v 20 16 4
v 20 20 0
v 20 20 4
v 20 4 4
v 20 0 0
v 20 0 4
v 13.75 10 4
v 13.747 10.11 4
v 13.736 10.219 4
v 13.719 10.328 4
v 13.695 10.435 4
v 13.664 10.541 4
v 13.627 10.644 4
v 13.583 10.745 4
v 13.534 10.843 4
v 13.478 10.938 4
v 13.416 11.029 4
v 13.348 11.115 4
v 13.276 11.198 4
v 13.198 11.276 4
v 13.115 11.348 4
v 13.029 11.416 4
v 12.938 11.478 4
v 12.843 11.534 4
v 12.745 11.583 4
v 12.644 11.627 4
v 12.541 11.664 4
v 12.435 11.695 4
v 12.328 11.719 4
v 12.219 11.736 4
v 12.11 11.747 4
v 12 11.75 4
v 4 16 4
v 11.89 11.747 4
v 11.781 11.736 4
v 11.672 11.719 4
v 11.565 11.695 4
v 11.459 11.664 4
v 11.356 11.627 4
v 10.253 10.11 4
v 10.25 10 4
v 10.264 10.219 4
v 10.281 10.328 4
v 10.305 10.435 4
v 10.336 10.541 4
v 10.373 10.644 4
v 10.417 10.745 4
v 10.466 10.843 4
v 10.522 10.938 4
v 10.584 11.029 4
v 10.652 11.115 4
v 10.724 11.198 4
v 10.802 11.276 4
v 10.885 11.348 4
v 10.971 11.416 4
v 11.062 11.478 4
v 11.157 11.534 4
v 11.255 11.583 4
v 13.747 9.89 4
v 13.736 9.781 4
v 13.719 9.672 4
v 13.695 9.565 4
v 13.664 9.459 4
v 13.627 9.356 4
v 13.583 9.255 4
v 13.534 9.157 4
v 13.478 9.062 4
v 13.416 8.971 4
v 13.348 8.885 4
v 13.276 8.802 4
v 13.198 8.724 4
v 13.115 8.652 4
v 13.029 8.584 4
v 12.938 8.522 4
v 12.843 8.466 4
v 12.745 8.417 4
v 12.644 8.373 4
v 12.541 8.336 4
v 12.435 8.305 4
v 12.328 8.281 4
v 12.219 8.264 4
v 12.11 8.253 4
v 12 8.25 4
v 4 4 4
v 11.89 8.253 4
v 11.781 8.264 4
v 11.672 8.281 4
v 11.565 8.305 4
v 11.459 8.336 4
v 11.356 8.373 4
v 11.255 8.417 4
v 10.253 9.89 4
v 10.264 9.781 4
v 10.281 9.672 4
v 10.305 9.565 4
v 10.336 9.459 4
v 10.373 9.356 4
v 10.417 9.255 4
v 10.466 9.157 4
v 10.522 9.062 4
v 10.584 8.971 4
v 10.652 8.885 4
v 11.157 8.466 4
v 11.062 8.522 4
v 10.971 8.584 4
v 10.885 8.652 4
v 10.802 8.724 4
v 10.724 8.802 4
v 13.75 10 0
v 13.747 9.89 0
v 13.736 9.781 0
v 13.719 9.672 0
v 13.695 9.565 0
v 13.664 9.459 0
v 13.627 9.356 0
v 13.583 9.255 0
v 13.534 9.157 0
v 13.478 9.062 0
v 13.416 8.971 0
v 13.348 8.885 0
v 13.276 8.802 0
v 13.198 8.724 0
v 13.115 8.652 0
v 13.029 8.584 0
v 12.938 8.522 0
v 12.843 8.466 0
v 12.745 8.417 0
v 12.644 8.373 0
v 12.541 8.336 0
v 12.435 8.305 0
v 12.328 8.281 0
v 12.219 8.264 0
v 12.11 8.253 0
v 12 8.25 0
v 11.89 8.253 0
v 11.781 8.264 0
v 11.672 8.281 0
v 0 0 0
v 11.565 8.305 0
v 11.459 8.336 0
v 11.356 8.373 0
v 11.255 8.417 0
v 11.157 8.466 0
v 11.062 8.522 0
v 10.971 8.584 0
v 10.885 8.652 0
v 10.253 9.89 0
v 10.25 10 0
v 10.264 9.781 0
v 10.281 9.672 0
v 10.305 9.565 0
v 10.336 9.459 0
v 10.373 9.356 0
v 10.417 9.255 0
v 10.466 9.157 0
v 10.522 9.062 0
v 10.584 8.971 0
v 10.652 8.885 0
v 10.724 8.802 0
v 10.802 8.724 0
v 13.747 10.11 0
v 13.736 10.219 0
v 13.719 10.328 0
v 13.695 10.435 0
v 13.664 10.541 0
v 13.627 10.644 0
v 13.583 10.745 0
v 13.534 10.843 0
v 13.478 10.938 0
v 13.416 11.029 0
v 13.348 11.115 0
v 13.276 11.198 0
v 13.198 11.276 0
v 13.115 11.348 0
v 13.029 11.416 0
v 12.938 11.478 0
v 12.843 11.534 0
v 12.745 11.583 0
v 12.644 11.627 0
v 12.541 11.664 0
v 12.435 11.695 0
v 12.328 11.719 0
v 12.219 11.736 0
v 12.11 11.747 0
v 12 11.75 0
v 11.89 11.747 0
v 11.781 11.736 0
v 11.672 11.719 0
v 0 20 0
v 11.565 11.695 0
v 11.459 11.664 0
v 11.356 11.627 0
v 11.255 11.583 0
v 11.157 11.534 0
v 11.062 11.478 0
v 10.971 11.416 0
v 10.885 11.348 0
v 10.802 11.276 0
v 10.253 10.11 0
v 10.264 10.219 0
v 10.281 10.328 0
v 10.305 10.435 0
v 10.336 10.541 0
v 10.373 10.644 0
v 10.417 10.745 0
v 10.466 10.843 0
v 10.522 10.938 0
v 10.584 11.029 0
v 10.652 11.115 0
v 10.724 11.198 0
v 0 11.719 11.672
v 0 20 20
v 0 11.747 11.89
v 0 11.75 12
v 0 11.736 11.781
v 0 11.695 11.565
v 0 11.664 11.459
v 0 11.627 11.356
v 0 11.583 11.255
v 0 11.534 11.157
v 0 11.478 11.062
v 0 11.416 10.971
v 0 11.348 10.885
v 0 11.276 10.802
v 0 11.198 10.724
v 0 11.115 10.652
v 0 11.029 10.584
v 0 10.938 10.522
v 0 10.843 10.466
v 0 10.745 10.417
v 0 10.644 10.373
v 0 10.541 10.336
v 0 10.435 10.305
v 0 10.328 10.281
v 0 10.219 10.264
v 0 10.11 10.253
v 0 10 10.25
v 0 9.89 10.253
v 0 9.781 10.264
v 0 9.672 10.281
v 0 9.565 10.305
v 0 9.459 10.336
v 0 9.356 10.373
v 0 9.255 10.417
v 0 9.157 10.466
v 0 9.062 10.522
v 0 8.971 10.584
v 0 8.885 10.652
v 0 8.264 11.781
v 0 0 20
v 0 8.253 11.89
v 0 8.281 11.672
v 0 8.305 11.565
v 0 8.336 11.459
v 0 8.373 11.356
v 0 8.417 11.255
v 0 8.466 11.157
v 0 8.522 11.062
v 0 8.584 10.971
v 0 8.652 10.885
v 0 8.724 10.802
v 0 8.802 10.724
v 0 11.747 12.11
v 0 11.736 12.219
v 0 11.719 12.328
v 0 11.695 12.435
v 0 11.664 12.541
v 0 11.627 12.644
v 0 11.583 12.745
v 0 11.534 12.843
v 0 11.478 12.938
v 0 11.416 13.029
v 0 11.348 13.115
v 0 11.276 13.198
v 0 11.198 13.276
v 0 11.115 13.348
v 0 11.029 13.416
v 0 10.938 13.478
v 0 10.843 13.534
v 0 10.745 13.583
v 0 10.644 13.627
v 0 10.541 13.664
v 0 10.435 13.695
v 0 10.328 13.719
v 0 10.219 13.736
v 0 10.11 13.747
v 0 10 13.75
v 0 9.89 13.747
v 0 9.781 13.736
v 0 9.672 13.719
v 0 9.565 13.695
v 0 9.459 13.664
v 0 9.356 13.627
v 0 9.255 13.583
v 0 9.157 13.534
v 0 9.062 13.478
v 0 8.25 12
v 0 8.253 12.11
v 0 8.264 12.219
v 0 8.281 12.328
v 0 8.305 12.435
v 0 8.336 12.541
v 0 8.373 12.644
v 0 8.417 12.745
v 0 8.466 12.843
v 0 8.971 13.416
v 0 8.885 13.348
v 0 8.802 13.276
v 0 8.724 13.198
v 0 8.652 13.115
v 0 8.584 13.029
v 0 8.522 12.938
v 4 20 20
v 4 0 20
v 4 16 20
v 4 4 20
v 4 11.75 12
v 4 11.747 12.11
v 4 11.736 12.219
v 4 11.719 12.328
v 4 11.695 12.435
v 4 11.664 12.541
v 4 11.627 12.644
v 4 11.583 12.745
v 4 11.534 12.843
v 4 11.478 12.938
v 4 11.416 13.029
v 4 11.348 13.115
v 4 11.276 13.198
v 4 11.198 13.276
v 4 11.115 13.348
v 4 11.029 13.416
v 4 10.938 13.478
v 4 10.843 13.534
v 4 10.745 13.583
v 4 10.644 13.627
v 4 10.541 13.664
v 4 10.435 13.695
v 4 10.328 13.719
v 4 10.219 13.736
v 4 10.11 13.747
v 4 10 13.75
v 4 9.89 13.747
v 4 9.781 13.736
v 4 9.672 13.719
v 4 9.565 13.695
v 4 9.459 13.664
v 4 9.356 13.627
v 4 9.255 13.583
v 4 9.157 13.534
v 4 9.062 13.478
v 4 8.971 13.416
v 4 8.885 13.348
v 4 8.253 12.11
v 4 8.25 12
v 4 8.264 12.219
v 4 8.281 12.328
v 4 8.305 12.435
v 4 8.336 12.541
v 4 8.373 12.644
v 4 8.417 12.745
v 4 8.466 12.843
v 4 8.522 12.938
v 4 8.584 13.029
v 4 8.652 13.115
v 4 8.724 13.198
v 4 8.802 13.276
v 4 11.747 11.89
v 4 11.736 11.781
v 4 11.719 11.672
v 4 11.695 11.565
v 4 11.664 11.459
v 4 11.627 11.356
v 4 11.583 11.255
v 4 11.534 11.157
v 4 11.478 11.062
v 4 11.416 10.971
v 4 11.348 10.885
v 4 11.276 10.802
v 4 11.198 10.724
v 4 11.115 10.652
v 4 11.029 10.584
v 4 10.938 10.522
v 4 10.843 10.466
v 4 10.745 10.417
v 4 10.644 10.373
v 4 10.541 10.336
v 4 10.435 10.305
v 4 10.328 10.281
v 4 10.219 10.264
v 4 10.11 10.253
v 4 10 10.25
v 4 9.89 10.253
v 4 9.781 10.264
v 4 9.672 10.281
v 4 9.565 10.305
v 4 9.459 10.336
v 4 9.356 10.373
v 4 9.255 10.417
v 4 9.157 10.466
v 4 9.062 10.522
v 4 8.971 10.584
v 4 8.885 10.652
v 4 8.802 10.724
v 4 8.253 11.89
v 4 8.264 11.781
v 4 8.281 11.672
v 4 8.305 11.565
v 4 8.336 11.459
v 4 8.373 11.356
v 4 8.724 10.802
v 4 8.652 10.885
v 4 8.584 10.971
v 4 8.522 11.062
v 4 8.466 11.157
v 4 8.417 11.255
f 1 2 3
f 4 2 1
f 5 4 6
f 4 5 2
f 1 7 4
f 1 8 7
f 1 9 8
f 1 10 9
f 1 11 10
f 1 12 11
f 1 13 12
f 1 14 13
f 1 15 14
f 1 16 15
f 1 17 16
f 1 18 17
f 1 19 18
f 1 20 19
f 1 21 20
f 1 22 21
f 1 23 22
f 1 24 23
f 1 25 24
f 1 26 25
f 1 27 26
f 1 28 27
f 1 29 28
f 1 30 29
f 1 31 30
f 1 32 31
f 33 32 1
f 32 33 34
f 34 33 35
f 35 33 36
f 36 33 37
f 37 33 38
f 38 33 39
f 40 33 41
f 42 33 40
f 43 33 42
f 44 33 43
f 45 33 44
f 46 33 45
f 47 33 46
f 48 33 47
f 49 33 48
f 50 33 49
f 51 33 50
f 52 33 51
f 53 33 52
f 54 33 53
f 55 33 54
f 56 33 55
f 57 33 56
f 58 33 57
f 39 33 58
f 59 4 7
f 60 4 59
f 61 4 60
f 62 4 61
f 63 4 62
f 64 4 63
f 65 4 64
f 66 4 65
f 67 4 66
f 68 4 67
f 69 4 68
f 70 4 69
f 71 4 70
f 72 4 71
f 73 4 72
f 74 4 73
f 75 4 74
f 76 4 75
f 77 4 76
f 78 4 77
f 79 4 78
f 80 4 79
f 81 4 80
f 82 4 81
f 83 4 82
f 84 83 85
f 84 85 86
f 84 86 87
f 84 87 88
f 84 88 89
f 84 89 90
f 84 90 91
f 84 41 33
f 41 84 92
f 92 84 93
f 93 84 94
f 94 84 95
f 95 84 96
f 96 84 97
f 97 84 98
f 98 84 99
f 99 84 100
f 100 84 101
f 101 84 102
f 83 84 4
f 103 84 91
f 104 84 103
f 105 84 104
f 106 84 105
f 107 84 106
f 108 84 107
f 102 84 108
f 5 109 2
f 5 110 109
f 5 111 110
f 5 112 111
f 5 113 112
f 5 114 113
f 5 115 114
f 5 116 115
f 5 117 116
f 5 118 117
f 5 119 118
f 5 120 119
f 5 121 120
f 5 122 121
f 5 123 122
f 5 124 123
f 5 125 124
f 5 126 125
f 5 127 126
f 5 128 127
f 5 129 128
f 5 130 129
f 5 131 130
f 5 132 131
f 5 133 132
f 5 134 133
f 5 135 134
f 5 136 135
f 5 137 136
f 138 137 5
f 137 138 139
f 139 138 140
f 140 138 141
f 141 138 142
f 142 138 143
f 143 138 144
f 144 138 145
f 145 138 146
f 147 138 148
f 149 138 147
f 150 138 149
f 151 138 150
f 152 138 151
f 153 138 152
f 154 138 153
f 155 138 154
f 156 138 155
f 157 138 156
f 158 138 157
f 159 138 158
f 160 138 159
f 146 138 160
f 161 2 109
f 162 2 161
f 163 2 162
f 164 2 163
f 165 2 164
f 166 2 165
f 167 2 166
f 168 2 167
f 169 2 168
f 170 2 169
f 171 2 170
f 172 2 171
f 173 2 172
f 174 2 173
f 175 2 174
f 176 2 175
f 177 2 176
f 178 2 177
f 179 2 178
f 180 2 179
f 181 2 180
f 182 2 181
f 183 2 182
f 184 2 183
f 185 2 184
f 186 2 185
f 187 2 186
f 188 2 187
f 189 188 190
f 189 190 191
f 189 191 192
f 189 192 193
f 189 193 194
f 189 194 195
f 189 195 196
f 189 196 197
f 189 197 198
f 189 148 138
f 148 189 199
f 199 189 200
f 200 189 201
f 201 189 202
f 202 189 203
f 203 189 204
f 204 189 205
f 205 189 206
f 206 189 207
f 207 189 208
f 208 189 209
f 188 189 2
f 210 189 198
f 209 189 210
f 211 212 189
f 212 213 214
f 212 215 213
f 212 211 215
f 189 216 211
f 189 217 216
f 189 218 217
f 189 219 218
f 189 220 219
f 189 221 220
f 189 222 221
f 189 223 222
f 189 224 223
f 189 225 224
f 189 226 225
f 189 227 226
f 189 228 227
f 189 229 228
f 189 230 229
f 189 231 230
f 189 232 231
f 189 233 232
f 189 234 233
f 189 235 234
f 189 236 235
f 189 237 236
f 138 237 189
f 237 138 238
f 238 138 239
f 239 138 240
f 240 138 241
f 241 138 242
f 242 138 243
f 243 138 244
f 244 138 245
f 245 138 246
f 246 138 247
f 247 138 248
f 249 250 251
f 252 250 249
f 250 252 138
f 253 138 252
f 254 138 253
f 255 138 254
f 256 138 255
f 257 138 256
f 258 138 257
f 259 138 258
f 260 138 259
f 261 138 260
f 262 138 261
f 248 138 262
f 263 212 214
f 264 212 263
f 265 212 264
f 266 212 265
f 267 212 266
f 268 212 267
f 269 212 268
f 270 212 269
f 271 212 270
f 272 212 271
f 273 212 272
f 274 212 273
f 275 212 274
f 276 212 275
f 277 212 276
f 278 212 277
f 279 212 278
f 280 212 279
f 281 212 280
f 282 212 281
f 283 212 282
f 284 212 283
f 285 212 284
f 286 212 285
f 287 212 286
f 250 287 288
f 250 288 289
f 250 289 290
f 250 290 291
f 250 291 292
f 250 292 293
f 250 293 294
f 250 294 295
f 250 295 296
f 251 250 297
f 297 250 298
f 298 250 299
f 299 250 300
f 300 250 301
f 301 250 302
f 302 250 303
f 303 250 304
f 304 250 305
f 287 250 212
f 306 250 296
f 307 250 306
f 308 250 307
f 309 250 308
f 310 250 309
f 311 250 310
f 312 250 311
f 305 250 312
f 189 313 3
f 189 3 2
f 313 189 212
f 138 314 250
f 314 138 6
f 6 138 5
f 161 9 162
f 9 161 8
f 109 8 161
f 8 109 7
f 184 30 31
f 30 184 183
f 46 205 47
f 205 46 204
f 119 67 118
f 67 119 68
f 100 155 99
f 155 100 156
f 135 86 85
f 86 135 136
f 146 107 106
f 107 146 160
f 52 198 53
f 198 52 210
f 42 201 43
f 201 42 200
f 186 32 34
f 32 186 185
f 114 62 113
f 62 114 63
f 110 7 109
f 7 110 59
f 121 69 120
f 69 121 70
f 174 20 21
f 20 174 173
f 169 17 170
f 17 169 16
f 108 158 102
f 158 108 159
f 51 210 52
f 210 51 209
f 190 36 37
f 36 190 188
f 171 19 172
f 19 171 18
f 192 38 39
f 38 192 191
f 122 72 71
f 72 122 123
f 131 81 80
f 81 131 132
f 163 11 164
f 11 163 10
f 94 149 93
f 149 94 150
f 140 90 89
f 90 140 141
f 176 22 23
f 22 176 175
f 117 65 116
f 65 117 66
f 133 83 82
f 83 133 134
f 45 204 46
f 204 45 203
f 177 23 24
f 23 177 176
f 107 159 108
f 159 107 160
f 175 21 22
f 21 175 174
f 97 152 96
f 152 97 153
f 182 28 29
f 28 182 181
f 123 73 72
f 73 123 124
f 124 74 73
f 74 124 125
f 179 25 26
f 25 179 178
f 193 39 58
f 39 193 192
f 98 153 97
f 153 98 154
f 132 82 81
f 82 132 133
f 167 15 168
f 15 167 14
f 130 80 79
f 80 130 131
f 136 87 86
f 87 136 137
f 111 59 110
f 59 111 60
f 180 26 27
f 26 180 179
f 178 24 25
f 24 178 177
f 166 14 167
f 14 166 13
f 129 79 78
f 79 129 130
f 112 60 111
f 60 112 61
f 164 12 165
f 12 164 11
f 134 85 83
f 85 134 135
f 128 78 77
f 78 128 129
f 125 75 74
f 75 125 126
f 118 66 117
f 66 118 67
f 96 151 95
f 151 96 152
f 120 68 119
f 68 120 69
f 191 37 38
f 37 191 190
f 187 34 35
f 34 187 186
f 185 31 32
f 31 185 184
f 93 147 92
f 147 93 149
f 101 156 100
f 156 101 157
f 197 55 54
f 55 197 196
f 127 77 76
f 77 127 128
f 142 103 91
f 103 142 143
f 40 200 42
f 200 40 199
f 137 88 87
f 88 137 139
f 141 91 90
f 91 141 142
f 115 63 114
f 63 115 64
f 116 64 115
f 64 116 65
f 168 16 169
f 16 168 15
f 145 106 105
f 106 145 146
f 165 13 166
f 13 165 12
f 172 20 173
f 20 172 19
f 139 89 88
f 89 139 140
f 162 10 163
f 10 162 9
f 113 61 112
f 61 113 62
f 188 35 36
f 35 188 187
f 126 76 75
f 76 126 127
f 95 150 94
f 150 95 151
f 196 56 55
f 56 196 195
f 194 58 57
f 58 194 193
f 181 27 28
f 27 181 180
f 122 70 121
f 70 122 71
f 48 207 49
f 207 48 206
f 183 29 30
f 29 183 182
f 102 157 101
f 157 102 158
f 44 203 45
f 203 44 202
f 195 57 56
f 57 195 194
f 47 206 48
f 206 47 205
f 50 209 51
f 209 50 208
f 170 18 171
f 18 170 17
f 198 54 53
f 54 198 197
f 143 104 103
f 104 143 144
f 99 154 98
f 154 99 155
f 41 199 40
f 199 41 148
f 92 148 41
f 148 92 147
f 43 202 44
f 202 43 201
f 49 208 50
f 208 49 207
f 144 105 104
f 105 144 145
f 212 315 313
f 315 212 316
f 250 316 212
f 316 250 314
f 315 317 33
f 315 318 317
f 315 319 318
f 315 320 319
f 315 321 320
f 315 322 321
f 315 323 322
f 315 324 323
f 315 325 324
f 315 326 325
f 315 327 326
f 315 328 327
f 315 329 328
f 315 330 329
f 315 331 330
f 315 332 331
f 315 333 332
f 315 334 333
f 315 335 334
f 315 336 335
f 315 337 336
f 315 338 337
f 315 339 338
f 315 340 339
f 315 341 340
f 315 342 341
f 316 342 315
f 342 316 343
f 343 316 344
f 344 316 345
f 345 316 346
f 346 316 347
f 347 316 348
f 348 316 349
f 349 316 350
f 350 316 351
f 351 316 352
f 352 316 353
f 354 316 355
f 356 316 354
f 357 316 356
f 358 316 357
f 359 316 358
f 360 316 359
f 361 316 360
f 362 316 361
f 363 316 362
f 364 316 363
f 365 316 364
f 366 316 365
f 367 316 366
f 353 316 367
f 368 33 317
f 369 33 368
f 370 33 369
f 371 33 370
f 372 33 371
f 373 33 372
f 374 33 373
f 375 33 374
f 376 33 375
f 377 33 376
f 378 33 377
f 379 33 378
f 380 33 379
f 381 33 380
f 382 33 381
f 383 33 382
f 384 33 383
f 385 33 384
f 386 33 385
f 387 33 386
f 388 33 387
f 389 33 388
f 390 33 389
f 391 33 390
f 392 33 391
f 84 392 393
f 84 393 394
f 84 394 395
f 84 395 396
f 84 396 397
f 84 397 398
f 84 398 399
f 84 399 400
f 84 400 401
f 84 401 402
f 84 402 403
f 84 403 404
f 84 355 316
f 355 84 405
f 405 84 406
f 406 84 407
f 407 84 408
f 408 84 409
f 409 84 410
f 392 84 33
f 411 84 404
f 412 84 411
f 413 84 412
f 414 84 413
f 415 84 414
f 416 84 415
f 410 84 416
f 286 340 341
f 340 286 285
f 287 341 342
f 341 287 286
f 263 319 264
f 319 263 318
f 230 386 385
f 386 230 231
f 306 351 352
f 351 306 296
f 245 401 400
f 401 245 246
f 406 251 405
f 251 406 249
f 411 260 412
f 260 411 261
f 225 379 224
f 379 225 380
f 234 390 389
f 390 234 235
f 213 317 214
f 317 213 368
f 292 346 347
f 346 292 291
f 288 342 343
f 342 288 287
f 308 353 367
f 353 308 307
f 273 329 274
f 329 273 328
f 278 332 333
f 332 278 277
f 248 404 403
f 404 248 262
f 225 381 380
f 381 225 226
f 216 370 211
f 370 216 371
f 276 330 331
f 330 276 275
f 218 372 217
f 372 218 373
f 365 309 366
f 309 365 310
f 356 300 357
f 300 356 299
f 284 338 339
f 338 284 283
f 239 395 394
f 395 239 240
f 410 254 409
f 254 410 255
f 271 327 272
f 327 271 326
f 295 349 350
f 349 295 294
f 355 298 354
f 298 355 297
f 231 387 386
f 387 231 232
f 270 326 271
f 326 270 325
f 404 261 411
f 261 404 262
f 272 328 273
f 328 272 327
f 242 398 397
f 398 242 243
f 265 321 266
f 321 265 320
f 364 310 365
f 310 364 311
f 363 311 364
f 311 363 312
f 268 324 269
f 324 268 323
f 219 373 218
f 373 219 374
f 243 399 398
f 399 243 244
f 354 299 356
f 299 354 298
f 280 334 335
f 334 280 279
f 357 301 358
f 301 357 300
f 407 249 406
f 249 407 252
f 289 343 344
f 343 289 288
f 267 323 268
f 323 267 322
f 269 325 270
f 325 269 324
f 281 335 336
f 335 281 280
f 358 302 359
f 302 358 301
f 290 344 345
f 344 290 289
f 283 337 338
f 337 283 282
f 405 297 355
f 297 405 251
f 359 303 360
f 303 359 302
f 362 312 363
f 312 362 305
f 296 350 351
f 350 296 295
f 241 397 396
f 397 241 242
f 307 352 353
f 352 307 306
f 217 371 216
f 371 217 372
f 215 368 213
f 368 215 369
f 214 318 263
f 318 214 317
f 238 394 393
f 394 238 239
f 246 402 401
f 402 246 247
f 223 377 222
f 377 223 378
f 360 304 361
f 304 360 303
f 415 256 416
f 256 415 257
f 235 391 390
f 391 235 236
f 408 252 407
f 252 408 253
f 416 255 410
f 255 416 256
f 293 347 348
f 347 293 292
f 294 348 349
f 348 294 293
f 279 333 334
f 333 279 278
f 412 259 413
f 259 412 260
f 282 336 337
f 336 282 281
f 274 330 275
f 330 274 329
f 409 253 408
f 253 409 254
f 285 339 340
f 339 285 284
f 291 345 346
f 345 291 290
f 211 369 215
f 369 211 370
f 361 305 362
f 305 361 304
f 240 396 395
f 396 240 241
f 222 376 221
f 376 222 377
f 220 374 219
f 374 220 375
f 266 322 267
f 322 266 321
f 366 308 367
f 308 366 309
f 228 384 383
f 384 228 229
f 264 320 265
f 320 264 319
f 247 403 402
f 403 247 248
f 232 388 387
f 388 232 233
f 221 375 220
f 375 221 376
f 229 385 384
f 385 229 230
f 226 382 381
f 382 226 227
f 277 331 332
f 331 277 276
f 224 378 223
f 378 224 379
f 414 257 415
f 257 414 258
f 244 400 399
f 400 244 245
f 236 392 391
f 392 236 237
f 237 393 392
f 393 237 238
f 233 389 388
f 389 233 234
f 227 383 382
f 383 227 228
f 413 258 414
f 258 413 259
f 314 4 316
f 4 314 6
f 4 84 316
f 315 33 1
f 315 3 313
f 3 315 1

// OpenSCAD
$fn = 100;

bracket_side();
translate([4, 0, 0]) rotate([0, 270, 0]) bracket_side();

// add a trianglular support
translate([4, 0, 0]) rotate([0, 270, 270]) bracket_angle();
translate([4, 16, 0]) rotate([0, 270, 270]) bracket_angle();

module bracket_angle() {
    // Hacky polygon...
    linear_extrude(height=4)
    polygon(
        points=[
            [0,0],
            [20,0],
            [4, 16]
        ],
        paths=[
            [0,1,2]
        ]
    );
}


module bracket_side() {
    difference() {
        cube([20, 20, 4]);
        translate([12, 10, -0.1]) cylinder(h=6, d=3.5);
    }
}
